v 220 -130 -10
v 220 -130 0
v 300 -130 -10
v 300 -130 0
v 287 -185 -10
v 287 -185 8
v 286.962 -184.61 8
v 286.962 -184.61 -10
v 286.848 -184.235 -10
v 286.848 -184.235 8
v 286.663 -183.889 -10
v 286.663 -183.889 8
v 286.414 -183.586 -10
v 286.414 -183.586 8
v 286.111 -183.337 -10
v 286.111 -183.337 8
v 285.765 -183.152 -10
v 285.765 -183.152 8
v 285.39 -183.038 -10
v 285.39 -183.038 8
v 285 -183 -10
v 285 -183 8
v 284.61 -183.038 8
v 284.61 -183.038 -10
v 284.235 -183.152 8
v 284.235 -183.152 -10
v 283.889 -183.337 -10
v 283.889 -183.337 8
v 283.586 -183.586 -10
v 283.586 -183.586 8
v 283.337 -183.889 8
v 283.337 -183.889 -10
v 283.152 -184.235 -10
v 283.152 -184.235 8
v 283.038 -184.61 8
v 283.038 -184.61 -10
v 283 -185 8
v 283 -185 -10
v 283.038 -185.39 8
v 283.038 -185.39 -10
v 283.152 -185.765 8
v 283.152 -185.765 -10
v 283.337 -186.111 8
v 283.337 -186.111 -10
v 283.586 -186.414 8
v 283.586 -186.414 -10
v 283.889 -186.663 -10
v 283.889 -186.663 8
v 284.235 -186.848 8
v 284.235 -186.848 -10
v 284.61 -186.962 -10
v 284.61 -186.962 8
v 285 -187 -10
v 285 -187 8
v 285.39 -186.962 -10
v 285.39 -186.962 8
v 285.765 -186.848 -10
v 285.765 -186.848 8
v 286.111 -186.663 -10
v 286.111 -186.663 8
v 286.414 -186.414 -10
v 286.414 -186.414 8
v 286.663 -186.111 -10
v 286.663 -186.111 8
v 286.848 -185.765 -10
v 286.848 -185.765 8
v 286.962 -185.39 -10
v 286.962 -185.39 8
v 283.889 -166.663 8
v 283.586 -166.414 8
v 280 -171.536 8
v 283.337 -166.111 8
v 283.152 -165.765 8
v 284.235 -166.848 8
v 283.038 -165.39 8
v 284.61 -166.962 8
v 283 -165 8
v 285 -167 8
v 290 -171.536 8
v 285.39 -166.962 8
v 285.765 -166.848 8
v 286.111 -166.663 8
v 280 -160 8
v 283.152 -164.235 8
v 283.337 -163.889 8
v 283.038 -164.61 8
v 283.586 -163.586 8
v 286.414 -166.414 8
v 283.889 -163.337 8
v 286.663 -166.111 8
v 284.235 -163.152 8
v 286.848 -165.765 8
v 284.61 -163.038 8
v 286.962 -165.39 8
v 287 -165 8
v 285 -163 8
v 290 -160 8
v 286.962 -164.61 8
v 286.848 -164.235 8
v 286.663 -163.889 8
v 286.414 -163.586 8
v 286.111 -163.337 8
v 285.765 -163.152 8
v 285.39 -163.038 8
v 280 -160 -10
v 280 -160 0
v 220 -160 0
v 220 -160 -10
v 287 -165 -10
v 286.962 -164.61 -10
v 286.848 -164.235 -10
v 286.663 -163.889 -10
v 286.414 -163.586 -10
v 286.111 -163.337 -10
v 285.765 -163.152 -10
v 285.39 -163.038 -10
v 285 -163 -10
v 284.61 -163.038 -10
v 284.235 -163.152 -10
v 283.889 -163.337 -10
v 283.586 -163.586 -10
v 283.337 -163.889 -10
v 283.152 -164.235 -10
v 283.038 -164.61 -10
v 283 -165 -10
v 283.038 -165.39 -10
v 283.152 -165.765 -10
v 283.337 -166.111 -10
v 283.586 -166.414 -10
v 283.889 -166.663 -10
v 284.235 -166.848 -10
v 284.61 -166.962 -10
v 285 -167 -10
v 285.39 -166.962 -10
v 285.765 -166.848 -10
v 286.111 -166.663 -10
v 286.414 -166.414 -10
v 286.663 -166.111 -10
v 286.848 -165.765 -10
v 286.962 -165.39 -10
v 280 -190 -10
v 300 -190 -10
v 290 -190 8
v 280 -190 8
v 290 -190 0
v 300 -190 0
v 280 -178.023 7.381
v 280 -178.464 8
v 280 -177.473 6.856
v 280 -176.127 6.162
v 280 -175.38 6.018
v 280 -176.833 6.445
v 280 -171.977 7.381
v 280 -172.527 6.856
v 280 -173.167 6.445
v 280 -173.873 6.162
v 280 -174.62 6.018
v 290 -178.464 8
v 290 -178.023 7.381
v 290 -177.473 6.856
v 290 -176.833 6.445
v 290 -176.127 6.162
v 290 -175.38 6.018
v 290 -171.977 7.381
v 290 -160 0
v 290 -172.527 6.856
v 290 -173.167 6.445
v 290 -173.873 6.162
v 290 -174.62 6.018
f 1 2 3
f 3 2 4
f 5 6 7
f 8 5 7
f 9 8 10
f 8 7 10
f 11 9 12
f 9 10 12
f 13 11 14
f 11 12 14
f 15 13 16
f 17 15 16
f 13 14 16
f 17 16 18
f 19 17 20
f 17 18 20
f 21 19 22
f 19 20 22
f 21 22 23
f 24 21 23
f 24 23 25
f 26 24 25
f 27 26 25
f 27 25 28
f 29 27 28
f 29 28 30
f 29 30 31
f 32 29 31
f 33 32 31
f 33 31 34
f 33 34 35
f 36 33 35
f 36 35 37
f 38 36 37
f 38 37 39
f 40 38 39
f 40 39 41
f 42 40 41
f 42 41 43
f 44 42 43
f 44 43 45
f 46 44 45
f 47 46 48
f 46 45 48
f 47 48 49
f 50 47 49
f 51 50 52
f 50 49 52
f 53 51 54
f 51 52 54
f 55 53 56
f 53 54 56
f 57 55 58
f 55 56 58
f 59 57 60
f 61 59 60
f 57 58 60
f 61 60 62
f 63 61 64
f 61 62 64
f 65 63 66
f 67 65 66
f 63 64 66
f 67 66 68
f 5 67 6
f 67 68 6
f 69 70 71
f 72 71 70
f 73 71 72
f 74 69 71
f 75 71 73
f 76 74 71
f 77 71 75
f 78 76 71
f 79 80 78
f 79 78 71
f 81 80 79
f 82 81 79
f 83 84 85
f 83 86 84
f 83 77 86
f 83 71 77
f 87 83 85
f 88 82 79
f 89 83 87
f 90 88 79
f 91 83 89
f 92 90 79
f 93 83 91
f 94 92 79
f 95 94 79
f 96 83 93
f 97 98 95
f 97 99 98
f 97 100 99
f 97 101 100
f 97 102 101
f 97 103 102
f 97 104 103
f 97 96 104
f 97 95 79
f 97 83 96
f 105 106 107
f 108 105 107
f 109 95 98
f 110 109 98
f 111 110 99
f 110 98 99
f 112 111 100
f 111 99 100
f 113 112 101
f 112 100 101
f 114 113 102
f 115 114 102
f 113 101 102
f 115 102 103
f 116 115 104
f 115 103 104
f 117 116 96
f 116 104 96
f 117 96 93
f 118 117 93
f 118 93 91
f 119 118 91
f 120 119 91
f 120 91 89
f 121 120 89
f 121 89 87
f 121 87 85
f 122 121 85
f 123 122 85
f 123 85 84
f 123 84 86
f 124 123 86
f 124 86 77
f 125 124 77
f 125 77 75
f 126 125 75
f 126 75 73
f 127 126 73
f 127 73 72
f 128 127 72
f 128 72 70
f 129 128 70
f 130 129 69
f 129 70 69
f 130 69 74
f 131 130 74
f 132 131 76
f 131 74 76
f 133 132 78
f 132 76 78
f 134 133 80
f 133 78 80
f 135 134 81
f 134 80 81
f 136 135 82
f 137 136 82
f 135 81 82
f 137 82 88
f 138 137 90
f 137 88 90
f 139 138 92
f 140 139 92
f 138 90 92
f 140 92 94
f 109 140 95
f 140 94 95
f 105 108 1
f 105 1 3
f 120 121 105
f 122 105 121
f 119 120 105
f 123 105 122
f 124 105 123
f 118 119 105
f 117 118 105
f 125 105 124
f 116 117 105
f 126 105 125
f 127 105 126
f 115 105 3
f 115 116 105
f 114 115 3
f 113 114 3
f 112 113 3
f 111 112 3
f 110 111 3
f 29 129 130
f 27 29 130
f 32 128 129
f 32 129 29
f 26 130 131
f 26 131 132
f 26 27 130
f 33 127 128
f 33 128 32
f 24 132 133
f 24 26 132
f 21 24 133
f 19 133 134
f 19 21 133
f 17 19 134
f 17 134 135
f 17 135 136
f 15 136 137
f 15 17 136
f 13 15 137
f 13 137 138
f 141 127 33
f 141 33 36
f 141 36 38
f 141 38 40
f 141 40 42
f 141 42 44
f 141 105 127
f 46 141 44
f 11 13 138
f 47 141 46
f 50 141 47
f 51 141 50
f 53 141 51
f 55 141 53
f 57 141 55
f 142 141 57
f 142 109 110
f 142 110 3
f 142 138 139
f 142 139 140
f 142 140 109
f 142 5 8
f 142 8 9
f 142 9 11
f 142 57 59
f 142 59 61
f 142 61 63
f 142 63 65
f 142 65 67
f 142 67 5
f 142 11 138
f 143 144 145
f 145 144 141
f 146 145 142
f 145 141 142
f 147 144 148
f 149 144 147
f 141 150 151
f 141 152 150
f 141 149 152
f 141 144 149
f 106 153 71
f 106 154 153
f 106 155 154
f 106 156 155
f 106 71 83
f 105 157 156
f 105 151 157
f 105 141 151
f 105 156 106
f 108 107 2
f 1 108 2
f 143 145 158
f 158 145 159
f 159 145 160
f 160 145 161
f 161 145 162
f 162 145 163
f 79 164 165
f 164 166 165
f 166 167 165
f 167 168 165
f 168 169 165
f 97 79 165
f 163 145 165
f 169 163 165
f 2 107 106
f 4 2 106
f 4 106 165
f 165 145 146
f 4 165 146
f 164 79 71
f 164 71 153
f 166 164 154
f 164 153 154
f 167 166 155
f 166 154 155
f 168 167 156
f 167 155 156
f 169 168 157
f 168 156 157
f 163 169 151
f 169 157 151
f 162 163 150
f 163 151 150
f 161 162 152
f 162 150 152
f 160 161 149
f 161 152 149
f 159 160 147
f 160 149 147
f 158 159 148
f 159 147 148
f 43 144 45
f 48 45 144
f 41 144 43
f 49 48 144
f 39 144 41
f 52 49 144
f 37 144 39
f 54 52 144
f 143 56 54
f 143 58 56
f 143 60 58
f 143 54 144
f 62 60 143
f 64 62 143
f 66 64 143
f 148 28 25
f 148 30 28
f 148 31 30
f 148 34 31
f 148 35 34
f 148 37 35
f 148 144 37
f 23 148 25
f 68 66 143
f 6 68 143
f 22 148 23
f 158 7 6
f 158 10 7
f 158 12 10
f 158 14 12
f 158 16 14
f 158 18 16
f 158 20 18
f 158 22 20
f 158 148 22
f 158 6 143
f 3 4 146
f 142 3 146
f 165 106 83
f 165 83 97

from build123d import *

# Parameters (mm, degrees)
PAD005_DEPTH    = 10
SKETCH009_W     = 10
SKETCH009_H     = 30
PAD006_DEPTH    = 8
SKETCH010_R     = 4
POCKET003_DEPTH = 10
SKETCH011_R     = 2
POCKET004_DEPTH = 20
SKETCH012_R     = 2
POCKET005_DEPTH = 20


with BuildPart() as part:
    # Sketch008 → Pad005 (new body)
    with BuildSketch(Plane(origin=(0, 0, 0), x_dir=(1, 0, 0), z_dir=(0, 0, -1))):
        Polygon((280, 160), (220, 160), (220, 130), (300, 130), (300, 190), (280, 190), align=None)
    extrude(amount=PAD005_DEPTH)

    # Sketch009 → Pad006 (new body)
    with BuildSketch(Plane.XY):
        with Locations((285, -175)):
            Rectangle(SKETCH009_W, SKETCH009_H)
    extrude(amount=PAD006_DEPTH)

    # Sketch010 → Pocket003 (cut)
    with BuildSketch(Plane(origin=(280, 0, 0), x_dir=(0, -1, 0), z_dir=(-1, 0, 0))):
        with Locations((175, 10)):
            Circle(SKETCH010_R)
    extrude(amount=-POCKET003_DEPTH, mode=Mode.SUBTRACT)

    # Sketch011 → Pocket004 (cut)
    with BuildSketch(Plane.XY.offset(8)):
        with Locations((285, -185)):
            Circle(SKETCH011_R)
    extrude(amount=-POCKET004_DEPTH, mode=Mode.SUBTRACT)

    # Sketch012 → Pocket005 (cut)
    with BuildSketch(Plane.XY.offset(8)):
        with Locations((285, -165)):
            Circle(SKETCH012_R)
    extrude(amount=-POCKET005_DEPTH, mode=Mode.SUBTRACT)


solid = part.part
